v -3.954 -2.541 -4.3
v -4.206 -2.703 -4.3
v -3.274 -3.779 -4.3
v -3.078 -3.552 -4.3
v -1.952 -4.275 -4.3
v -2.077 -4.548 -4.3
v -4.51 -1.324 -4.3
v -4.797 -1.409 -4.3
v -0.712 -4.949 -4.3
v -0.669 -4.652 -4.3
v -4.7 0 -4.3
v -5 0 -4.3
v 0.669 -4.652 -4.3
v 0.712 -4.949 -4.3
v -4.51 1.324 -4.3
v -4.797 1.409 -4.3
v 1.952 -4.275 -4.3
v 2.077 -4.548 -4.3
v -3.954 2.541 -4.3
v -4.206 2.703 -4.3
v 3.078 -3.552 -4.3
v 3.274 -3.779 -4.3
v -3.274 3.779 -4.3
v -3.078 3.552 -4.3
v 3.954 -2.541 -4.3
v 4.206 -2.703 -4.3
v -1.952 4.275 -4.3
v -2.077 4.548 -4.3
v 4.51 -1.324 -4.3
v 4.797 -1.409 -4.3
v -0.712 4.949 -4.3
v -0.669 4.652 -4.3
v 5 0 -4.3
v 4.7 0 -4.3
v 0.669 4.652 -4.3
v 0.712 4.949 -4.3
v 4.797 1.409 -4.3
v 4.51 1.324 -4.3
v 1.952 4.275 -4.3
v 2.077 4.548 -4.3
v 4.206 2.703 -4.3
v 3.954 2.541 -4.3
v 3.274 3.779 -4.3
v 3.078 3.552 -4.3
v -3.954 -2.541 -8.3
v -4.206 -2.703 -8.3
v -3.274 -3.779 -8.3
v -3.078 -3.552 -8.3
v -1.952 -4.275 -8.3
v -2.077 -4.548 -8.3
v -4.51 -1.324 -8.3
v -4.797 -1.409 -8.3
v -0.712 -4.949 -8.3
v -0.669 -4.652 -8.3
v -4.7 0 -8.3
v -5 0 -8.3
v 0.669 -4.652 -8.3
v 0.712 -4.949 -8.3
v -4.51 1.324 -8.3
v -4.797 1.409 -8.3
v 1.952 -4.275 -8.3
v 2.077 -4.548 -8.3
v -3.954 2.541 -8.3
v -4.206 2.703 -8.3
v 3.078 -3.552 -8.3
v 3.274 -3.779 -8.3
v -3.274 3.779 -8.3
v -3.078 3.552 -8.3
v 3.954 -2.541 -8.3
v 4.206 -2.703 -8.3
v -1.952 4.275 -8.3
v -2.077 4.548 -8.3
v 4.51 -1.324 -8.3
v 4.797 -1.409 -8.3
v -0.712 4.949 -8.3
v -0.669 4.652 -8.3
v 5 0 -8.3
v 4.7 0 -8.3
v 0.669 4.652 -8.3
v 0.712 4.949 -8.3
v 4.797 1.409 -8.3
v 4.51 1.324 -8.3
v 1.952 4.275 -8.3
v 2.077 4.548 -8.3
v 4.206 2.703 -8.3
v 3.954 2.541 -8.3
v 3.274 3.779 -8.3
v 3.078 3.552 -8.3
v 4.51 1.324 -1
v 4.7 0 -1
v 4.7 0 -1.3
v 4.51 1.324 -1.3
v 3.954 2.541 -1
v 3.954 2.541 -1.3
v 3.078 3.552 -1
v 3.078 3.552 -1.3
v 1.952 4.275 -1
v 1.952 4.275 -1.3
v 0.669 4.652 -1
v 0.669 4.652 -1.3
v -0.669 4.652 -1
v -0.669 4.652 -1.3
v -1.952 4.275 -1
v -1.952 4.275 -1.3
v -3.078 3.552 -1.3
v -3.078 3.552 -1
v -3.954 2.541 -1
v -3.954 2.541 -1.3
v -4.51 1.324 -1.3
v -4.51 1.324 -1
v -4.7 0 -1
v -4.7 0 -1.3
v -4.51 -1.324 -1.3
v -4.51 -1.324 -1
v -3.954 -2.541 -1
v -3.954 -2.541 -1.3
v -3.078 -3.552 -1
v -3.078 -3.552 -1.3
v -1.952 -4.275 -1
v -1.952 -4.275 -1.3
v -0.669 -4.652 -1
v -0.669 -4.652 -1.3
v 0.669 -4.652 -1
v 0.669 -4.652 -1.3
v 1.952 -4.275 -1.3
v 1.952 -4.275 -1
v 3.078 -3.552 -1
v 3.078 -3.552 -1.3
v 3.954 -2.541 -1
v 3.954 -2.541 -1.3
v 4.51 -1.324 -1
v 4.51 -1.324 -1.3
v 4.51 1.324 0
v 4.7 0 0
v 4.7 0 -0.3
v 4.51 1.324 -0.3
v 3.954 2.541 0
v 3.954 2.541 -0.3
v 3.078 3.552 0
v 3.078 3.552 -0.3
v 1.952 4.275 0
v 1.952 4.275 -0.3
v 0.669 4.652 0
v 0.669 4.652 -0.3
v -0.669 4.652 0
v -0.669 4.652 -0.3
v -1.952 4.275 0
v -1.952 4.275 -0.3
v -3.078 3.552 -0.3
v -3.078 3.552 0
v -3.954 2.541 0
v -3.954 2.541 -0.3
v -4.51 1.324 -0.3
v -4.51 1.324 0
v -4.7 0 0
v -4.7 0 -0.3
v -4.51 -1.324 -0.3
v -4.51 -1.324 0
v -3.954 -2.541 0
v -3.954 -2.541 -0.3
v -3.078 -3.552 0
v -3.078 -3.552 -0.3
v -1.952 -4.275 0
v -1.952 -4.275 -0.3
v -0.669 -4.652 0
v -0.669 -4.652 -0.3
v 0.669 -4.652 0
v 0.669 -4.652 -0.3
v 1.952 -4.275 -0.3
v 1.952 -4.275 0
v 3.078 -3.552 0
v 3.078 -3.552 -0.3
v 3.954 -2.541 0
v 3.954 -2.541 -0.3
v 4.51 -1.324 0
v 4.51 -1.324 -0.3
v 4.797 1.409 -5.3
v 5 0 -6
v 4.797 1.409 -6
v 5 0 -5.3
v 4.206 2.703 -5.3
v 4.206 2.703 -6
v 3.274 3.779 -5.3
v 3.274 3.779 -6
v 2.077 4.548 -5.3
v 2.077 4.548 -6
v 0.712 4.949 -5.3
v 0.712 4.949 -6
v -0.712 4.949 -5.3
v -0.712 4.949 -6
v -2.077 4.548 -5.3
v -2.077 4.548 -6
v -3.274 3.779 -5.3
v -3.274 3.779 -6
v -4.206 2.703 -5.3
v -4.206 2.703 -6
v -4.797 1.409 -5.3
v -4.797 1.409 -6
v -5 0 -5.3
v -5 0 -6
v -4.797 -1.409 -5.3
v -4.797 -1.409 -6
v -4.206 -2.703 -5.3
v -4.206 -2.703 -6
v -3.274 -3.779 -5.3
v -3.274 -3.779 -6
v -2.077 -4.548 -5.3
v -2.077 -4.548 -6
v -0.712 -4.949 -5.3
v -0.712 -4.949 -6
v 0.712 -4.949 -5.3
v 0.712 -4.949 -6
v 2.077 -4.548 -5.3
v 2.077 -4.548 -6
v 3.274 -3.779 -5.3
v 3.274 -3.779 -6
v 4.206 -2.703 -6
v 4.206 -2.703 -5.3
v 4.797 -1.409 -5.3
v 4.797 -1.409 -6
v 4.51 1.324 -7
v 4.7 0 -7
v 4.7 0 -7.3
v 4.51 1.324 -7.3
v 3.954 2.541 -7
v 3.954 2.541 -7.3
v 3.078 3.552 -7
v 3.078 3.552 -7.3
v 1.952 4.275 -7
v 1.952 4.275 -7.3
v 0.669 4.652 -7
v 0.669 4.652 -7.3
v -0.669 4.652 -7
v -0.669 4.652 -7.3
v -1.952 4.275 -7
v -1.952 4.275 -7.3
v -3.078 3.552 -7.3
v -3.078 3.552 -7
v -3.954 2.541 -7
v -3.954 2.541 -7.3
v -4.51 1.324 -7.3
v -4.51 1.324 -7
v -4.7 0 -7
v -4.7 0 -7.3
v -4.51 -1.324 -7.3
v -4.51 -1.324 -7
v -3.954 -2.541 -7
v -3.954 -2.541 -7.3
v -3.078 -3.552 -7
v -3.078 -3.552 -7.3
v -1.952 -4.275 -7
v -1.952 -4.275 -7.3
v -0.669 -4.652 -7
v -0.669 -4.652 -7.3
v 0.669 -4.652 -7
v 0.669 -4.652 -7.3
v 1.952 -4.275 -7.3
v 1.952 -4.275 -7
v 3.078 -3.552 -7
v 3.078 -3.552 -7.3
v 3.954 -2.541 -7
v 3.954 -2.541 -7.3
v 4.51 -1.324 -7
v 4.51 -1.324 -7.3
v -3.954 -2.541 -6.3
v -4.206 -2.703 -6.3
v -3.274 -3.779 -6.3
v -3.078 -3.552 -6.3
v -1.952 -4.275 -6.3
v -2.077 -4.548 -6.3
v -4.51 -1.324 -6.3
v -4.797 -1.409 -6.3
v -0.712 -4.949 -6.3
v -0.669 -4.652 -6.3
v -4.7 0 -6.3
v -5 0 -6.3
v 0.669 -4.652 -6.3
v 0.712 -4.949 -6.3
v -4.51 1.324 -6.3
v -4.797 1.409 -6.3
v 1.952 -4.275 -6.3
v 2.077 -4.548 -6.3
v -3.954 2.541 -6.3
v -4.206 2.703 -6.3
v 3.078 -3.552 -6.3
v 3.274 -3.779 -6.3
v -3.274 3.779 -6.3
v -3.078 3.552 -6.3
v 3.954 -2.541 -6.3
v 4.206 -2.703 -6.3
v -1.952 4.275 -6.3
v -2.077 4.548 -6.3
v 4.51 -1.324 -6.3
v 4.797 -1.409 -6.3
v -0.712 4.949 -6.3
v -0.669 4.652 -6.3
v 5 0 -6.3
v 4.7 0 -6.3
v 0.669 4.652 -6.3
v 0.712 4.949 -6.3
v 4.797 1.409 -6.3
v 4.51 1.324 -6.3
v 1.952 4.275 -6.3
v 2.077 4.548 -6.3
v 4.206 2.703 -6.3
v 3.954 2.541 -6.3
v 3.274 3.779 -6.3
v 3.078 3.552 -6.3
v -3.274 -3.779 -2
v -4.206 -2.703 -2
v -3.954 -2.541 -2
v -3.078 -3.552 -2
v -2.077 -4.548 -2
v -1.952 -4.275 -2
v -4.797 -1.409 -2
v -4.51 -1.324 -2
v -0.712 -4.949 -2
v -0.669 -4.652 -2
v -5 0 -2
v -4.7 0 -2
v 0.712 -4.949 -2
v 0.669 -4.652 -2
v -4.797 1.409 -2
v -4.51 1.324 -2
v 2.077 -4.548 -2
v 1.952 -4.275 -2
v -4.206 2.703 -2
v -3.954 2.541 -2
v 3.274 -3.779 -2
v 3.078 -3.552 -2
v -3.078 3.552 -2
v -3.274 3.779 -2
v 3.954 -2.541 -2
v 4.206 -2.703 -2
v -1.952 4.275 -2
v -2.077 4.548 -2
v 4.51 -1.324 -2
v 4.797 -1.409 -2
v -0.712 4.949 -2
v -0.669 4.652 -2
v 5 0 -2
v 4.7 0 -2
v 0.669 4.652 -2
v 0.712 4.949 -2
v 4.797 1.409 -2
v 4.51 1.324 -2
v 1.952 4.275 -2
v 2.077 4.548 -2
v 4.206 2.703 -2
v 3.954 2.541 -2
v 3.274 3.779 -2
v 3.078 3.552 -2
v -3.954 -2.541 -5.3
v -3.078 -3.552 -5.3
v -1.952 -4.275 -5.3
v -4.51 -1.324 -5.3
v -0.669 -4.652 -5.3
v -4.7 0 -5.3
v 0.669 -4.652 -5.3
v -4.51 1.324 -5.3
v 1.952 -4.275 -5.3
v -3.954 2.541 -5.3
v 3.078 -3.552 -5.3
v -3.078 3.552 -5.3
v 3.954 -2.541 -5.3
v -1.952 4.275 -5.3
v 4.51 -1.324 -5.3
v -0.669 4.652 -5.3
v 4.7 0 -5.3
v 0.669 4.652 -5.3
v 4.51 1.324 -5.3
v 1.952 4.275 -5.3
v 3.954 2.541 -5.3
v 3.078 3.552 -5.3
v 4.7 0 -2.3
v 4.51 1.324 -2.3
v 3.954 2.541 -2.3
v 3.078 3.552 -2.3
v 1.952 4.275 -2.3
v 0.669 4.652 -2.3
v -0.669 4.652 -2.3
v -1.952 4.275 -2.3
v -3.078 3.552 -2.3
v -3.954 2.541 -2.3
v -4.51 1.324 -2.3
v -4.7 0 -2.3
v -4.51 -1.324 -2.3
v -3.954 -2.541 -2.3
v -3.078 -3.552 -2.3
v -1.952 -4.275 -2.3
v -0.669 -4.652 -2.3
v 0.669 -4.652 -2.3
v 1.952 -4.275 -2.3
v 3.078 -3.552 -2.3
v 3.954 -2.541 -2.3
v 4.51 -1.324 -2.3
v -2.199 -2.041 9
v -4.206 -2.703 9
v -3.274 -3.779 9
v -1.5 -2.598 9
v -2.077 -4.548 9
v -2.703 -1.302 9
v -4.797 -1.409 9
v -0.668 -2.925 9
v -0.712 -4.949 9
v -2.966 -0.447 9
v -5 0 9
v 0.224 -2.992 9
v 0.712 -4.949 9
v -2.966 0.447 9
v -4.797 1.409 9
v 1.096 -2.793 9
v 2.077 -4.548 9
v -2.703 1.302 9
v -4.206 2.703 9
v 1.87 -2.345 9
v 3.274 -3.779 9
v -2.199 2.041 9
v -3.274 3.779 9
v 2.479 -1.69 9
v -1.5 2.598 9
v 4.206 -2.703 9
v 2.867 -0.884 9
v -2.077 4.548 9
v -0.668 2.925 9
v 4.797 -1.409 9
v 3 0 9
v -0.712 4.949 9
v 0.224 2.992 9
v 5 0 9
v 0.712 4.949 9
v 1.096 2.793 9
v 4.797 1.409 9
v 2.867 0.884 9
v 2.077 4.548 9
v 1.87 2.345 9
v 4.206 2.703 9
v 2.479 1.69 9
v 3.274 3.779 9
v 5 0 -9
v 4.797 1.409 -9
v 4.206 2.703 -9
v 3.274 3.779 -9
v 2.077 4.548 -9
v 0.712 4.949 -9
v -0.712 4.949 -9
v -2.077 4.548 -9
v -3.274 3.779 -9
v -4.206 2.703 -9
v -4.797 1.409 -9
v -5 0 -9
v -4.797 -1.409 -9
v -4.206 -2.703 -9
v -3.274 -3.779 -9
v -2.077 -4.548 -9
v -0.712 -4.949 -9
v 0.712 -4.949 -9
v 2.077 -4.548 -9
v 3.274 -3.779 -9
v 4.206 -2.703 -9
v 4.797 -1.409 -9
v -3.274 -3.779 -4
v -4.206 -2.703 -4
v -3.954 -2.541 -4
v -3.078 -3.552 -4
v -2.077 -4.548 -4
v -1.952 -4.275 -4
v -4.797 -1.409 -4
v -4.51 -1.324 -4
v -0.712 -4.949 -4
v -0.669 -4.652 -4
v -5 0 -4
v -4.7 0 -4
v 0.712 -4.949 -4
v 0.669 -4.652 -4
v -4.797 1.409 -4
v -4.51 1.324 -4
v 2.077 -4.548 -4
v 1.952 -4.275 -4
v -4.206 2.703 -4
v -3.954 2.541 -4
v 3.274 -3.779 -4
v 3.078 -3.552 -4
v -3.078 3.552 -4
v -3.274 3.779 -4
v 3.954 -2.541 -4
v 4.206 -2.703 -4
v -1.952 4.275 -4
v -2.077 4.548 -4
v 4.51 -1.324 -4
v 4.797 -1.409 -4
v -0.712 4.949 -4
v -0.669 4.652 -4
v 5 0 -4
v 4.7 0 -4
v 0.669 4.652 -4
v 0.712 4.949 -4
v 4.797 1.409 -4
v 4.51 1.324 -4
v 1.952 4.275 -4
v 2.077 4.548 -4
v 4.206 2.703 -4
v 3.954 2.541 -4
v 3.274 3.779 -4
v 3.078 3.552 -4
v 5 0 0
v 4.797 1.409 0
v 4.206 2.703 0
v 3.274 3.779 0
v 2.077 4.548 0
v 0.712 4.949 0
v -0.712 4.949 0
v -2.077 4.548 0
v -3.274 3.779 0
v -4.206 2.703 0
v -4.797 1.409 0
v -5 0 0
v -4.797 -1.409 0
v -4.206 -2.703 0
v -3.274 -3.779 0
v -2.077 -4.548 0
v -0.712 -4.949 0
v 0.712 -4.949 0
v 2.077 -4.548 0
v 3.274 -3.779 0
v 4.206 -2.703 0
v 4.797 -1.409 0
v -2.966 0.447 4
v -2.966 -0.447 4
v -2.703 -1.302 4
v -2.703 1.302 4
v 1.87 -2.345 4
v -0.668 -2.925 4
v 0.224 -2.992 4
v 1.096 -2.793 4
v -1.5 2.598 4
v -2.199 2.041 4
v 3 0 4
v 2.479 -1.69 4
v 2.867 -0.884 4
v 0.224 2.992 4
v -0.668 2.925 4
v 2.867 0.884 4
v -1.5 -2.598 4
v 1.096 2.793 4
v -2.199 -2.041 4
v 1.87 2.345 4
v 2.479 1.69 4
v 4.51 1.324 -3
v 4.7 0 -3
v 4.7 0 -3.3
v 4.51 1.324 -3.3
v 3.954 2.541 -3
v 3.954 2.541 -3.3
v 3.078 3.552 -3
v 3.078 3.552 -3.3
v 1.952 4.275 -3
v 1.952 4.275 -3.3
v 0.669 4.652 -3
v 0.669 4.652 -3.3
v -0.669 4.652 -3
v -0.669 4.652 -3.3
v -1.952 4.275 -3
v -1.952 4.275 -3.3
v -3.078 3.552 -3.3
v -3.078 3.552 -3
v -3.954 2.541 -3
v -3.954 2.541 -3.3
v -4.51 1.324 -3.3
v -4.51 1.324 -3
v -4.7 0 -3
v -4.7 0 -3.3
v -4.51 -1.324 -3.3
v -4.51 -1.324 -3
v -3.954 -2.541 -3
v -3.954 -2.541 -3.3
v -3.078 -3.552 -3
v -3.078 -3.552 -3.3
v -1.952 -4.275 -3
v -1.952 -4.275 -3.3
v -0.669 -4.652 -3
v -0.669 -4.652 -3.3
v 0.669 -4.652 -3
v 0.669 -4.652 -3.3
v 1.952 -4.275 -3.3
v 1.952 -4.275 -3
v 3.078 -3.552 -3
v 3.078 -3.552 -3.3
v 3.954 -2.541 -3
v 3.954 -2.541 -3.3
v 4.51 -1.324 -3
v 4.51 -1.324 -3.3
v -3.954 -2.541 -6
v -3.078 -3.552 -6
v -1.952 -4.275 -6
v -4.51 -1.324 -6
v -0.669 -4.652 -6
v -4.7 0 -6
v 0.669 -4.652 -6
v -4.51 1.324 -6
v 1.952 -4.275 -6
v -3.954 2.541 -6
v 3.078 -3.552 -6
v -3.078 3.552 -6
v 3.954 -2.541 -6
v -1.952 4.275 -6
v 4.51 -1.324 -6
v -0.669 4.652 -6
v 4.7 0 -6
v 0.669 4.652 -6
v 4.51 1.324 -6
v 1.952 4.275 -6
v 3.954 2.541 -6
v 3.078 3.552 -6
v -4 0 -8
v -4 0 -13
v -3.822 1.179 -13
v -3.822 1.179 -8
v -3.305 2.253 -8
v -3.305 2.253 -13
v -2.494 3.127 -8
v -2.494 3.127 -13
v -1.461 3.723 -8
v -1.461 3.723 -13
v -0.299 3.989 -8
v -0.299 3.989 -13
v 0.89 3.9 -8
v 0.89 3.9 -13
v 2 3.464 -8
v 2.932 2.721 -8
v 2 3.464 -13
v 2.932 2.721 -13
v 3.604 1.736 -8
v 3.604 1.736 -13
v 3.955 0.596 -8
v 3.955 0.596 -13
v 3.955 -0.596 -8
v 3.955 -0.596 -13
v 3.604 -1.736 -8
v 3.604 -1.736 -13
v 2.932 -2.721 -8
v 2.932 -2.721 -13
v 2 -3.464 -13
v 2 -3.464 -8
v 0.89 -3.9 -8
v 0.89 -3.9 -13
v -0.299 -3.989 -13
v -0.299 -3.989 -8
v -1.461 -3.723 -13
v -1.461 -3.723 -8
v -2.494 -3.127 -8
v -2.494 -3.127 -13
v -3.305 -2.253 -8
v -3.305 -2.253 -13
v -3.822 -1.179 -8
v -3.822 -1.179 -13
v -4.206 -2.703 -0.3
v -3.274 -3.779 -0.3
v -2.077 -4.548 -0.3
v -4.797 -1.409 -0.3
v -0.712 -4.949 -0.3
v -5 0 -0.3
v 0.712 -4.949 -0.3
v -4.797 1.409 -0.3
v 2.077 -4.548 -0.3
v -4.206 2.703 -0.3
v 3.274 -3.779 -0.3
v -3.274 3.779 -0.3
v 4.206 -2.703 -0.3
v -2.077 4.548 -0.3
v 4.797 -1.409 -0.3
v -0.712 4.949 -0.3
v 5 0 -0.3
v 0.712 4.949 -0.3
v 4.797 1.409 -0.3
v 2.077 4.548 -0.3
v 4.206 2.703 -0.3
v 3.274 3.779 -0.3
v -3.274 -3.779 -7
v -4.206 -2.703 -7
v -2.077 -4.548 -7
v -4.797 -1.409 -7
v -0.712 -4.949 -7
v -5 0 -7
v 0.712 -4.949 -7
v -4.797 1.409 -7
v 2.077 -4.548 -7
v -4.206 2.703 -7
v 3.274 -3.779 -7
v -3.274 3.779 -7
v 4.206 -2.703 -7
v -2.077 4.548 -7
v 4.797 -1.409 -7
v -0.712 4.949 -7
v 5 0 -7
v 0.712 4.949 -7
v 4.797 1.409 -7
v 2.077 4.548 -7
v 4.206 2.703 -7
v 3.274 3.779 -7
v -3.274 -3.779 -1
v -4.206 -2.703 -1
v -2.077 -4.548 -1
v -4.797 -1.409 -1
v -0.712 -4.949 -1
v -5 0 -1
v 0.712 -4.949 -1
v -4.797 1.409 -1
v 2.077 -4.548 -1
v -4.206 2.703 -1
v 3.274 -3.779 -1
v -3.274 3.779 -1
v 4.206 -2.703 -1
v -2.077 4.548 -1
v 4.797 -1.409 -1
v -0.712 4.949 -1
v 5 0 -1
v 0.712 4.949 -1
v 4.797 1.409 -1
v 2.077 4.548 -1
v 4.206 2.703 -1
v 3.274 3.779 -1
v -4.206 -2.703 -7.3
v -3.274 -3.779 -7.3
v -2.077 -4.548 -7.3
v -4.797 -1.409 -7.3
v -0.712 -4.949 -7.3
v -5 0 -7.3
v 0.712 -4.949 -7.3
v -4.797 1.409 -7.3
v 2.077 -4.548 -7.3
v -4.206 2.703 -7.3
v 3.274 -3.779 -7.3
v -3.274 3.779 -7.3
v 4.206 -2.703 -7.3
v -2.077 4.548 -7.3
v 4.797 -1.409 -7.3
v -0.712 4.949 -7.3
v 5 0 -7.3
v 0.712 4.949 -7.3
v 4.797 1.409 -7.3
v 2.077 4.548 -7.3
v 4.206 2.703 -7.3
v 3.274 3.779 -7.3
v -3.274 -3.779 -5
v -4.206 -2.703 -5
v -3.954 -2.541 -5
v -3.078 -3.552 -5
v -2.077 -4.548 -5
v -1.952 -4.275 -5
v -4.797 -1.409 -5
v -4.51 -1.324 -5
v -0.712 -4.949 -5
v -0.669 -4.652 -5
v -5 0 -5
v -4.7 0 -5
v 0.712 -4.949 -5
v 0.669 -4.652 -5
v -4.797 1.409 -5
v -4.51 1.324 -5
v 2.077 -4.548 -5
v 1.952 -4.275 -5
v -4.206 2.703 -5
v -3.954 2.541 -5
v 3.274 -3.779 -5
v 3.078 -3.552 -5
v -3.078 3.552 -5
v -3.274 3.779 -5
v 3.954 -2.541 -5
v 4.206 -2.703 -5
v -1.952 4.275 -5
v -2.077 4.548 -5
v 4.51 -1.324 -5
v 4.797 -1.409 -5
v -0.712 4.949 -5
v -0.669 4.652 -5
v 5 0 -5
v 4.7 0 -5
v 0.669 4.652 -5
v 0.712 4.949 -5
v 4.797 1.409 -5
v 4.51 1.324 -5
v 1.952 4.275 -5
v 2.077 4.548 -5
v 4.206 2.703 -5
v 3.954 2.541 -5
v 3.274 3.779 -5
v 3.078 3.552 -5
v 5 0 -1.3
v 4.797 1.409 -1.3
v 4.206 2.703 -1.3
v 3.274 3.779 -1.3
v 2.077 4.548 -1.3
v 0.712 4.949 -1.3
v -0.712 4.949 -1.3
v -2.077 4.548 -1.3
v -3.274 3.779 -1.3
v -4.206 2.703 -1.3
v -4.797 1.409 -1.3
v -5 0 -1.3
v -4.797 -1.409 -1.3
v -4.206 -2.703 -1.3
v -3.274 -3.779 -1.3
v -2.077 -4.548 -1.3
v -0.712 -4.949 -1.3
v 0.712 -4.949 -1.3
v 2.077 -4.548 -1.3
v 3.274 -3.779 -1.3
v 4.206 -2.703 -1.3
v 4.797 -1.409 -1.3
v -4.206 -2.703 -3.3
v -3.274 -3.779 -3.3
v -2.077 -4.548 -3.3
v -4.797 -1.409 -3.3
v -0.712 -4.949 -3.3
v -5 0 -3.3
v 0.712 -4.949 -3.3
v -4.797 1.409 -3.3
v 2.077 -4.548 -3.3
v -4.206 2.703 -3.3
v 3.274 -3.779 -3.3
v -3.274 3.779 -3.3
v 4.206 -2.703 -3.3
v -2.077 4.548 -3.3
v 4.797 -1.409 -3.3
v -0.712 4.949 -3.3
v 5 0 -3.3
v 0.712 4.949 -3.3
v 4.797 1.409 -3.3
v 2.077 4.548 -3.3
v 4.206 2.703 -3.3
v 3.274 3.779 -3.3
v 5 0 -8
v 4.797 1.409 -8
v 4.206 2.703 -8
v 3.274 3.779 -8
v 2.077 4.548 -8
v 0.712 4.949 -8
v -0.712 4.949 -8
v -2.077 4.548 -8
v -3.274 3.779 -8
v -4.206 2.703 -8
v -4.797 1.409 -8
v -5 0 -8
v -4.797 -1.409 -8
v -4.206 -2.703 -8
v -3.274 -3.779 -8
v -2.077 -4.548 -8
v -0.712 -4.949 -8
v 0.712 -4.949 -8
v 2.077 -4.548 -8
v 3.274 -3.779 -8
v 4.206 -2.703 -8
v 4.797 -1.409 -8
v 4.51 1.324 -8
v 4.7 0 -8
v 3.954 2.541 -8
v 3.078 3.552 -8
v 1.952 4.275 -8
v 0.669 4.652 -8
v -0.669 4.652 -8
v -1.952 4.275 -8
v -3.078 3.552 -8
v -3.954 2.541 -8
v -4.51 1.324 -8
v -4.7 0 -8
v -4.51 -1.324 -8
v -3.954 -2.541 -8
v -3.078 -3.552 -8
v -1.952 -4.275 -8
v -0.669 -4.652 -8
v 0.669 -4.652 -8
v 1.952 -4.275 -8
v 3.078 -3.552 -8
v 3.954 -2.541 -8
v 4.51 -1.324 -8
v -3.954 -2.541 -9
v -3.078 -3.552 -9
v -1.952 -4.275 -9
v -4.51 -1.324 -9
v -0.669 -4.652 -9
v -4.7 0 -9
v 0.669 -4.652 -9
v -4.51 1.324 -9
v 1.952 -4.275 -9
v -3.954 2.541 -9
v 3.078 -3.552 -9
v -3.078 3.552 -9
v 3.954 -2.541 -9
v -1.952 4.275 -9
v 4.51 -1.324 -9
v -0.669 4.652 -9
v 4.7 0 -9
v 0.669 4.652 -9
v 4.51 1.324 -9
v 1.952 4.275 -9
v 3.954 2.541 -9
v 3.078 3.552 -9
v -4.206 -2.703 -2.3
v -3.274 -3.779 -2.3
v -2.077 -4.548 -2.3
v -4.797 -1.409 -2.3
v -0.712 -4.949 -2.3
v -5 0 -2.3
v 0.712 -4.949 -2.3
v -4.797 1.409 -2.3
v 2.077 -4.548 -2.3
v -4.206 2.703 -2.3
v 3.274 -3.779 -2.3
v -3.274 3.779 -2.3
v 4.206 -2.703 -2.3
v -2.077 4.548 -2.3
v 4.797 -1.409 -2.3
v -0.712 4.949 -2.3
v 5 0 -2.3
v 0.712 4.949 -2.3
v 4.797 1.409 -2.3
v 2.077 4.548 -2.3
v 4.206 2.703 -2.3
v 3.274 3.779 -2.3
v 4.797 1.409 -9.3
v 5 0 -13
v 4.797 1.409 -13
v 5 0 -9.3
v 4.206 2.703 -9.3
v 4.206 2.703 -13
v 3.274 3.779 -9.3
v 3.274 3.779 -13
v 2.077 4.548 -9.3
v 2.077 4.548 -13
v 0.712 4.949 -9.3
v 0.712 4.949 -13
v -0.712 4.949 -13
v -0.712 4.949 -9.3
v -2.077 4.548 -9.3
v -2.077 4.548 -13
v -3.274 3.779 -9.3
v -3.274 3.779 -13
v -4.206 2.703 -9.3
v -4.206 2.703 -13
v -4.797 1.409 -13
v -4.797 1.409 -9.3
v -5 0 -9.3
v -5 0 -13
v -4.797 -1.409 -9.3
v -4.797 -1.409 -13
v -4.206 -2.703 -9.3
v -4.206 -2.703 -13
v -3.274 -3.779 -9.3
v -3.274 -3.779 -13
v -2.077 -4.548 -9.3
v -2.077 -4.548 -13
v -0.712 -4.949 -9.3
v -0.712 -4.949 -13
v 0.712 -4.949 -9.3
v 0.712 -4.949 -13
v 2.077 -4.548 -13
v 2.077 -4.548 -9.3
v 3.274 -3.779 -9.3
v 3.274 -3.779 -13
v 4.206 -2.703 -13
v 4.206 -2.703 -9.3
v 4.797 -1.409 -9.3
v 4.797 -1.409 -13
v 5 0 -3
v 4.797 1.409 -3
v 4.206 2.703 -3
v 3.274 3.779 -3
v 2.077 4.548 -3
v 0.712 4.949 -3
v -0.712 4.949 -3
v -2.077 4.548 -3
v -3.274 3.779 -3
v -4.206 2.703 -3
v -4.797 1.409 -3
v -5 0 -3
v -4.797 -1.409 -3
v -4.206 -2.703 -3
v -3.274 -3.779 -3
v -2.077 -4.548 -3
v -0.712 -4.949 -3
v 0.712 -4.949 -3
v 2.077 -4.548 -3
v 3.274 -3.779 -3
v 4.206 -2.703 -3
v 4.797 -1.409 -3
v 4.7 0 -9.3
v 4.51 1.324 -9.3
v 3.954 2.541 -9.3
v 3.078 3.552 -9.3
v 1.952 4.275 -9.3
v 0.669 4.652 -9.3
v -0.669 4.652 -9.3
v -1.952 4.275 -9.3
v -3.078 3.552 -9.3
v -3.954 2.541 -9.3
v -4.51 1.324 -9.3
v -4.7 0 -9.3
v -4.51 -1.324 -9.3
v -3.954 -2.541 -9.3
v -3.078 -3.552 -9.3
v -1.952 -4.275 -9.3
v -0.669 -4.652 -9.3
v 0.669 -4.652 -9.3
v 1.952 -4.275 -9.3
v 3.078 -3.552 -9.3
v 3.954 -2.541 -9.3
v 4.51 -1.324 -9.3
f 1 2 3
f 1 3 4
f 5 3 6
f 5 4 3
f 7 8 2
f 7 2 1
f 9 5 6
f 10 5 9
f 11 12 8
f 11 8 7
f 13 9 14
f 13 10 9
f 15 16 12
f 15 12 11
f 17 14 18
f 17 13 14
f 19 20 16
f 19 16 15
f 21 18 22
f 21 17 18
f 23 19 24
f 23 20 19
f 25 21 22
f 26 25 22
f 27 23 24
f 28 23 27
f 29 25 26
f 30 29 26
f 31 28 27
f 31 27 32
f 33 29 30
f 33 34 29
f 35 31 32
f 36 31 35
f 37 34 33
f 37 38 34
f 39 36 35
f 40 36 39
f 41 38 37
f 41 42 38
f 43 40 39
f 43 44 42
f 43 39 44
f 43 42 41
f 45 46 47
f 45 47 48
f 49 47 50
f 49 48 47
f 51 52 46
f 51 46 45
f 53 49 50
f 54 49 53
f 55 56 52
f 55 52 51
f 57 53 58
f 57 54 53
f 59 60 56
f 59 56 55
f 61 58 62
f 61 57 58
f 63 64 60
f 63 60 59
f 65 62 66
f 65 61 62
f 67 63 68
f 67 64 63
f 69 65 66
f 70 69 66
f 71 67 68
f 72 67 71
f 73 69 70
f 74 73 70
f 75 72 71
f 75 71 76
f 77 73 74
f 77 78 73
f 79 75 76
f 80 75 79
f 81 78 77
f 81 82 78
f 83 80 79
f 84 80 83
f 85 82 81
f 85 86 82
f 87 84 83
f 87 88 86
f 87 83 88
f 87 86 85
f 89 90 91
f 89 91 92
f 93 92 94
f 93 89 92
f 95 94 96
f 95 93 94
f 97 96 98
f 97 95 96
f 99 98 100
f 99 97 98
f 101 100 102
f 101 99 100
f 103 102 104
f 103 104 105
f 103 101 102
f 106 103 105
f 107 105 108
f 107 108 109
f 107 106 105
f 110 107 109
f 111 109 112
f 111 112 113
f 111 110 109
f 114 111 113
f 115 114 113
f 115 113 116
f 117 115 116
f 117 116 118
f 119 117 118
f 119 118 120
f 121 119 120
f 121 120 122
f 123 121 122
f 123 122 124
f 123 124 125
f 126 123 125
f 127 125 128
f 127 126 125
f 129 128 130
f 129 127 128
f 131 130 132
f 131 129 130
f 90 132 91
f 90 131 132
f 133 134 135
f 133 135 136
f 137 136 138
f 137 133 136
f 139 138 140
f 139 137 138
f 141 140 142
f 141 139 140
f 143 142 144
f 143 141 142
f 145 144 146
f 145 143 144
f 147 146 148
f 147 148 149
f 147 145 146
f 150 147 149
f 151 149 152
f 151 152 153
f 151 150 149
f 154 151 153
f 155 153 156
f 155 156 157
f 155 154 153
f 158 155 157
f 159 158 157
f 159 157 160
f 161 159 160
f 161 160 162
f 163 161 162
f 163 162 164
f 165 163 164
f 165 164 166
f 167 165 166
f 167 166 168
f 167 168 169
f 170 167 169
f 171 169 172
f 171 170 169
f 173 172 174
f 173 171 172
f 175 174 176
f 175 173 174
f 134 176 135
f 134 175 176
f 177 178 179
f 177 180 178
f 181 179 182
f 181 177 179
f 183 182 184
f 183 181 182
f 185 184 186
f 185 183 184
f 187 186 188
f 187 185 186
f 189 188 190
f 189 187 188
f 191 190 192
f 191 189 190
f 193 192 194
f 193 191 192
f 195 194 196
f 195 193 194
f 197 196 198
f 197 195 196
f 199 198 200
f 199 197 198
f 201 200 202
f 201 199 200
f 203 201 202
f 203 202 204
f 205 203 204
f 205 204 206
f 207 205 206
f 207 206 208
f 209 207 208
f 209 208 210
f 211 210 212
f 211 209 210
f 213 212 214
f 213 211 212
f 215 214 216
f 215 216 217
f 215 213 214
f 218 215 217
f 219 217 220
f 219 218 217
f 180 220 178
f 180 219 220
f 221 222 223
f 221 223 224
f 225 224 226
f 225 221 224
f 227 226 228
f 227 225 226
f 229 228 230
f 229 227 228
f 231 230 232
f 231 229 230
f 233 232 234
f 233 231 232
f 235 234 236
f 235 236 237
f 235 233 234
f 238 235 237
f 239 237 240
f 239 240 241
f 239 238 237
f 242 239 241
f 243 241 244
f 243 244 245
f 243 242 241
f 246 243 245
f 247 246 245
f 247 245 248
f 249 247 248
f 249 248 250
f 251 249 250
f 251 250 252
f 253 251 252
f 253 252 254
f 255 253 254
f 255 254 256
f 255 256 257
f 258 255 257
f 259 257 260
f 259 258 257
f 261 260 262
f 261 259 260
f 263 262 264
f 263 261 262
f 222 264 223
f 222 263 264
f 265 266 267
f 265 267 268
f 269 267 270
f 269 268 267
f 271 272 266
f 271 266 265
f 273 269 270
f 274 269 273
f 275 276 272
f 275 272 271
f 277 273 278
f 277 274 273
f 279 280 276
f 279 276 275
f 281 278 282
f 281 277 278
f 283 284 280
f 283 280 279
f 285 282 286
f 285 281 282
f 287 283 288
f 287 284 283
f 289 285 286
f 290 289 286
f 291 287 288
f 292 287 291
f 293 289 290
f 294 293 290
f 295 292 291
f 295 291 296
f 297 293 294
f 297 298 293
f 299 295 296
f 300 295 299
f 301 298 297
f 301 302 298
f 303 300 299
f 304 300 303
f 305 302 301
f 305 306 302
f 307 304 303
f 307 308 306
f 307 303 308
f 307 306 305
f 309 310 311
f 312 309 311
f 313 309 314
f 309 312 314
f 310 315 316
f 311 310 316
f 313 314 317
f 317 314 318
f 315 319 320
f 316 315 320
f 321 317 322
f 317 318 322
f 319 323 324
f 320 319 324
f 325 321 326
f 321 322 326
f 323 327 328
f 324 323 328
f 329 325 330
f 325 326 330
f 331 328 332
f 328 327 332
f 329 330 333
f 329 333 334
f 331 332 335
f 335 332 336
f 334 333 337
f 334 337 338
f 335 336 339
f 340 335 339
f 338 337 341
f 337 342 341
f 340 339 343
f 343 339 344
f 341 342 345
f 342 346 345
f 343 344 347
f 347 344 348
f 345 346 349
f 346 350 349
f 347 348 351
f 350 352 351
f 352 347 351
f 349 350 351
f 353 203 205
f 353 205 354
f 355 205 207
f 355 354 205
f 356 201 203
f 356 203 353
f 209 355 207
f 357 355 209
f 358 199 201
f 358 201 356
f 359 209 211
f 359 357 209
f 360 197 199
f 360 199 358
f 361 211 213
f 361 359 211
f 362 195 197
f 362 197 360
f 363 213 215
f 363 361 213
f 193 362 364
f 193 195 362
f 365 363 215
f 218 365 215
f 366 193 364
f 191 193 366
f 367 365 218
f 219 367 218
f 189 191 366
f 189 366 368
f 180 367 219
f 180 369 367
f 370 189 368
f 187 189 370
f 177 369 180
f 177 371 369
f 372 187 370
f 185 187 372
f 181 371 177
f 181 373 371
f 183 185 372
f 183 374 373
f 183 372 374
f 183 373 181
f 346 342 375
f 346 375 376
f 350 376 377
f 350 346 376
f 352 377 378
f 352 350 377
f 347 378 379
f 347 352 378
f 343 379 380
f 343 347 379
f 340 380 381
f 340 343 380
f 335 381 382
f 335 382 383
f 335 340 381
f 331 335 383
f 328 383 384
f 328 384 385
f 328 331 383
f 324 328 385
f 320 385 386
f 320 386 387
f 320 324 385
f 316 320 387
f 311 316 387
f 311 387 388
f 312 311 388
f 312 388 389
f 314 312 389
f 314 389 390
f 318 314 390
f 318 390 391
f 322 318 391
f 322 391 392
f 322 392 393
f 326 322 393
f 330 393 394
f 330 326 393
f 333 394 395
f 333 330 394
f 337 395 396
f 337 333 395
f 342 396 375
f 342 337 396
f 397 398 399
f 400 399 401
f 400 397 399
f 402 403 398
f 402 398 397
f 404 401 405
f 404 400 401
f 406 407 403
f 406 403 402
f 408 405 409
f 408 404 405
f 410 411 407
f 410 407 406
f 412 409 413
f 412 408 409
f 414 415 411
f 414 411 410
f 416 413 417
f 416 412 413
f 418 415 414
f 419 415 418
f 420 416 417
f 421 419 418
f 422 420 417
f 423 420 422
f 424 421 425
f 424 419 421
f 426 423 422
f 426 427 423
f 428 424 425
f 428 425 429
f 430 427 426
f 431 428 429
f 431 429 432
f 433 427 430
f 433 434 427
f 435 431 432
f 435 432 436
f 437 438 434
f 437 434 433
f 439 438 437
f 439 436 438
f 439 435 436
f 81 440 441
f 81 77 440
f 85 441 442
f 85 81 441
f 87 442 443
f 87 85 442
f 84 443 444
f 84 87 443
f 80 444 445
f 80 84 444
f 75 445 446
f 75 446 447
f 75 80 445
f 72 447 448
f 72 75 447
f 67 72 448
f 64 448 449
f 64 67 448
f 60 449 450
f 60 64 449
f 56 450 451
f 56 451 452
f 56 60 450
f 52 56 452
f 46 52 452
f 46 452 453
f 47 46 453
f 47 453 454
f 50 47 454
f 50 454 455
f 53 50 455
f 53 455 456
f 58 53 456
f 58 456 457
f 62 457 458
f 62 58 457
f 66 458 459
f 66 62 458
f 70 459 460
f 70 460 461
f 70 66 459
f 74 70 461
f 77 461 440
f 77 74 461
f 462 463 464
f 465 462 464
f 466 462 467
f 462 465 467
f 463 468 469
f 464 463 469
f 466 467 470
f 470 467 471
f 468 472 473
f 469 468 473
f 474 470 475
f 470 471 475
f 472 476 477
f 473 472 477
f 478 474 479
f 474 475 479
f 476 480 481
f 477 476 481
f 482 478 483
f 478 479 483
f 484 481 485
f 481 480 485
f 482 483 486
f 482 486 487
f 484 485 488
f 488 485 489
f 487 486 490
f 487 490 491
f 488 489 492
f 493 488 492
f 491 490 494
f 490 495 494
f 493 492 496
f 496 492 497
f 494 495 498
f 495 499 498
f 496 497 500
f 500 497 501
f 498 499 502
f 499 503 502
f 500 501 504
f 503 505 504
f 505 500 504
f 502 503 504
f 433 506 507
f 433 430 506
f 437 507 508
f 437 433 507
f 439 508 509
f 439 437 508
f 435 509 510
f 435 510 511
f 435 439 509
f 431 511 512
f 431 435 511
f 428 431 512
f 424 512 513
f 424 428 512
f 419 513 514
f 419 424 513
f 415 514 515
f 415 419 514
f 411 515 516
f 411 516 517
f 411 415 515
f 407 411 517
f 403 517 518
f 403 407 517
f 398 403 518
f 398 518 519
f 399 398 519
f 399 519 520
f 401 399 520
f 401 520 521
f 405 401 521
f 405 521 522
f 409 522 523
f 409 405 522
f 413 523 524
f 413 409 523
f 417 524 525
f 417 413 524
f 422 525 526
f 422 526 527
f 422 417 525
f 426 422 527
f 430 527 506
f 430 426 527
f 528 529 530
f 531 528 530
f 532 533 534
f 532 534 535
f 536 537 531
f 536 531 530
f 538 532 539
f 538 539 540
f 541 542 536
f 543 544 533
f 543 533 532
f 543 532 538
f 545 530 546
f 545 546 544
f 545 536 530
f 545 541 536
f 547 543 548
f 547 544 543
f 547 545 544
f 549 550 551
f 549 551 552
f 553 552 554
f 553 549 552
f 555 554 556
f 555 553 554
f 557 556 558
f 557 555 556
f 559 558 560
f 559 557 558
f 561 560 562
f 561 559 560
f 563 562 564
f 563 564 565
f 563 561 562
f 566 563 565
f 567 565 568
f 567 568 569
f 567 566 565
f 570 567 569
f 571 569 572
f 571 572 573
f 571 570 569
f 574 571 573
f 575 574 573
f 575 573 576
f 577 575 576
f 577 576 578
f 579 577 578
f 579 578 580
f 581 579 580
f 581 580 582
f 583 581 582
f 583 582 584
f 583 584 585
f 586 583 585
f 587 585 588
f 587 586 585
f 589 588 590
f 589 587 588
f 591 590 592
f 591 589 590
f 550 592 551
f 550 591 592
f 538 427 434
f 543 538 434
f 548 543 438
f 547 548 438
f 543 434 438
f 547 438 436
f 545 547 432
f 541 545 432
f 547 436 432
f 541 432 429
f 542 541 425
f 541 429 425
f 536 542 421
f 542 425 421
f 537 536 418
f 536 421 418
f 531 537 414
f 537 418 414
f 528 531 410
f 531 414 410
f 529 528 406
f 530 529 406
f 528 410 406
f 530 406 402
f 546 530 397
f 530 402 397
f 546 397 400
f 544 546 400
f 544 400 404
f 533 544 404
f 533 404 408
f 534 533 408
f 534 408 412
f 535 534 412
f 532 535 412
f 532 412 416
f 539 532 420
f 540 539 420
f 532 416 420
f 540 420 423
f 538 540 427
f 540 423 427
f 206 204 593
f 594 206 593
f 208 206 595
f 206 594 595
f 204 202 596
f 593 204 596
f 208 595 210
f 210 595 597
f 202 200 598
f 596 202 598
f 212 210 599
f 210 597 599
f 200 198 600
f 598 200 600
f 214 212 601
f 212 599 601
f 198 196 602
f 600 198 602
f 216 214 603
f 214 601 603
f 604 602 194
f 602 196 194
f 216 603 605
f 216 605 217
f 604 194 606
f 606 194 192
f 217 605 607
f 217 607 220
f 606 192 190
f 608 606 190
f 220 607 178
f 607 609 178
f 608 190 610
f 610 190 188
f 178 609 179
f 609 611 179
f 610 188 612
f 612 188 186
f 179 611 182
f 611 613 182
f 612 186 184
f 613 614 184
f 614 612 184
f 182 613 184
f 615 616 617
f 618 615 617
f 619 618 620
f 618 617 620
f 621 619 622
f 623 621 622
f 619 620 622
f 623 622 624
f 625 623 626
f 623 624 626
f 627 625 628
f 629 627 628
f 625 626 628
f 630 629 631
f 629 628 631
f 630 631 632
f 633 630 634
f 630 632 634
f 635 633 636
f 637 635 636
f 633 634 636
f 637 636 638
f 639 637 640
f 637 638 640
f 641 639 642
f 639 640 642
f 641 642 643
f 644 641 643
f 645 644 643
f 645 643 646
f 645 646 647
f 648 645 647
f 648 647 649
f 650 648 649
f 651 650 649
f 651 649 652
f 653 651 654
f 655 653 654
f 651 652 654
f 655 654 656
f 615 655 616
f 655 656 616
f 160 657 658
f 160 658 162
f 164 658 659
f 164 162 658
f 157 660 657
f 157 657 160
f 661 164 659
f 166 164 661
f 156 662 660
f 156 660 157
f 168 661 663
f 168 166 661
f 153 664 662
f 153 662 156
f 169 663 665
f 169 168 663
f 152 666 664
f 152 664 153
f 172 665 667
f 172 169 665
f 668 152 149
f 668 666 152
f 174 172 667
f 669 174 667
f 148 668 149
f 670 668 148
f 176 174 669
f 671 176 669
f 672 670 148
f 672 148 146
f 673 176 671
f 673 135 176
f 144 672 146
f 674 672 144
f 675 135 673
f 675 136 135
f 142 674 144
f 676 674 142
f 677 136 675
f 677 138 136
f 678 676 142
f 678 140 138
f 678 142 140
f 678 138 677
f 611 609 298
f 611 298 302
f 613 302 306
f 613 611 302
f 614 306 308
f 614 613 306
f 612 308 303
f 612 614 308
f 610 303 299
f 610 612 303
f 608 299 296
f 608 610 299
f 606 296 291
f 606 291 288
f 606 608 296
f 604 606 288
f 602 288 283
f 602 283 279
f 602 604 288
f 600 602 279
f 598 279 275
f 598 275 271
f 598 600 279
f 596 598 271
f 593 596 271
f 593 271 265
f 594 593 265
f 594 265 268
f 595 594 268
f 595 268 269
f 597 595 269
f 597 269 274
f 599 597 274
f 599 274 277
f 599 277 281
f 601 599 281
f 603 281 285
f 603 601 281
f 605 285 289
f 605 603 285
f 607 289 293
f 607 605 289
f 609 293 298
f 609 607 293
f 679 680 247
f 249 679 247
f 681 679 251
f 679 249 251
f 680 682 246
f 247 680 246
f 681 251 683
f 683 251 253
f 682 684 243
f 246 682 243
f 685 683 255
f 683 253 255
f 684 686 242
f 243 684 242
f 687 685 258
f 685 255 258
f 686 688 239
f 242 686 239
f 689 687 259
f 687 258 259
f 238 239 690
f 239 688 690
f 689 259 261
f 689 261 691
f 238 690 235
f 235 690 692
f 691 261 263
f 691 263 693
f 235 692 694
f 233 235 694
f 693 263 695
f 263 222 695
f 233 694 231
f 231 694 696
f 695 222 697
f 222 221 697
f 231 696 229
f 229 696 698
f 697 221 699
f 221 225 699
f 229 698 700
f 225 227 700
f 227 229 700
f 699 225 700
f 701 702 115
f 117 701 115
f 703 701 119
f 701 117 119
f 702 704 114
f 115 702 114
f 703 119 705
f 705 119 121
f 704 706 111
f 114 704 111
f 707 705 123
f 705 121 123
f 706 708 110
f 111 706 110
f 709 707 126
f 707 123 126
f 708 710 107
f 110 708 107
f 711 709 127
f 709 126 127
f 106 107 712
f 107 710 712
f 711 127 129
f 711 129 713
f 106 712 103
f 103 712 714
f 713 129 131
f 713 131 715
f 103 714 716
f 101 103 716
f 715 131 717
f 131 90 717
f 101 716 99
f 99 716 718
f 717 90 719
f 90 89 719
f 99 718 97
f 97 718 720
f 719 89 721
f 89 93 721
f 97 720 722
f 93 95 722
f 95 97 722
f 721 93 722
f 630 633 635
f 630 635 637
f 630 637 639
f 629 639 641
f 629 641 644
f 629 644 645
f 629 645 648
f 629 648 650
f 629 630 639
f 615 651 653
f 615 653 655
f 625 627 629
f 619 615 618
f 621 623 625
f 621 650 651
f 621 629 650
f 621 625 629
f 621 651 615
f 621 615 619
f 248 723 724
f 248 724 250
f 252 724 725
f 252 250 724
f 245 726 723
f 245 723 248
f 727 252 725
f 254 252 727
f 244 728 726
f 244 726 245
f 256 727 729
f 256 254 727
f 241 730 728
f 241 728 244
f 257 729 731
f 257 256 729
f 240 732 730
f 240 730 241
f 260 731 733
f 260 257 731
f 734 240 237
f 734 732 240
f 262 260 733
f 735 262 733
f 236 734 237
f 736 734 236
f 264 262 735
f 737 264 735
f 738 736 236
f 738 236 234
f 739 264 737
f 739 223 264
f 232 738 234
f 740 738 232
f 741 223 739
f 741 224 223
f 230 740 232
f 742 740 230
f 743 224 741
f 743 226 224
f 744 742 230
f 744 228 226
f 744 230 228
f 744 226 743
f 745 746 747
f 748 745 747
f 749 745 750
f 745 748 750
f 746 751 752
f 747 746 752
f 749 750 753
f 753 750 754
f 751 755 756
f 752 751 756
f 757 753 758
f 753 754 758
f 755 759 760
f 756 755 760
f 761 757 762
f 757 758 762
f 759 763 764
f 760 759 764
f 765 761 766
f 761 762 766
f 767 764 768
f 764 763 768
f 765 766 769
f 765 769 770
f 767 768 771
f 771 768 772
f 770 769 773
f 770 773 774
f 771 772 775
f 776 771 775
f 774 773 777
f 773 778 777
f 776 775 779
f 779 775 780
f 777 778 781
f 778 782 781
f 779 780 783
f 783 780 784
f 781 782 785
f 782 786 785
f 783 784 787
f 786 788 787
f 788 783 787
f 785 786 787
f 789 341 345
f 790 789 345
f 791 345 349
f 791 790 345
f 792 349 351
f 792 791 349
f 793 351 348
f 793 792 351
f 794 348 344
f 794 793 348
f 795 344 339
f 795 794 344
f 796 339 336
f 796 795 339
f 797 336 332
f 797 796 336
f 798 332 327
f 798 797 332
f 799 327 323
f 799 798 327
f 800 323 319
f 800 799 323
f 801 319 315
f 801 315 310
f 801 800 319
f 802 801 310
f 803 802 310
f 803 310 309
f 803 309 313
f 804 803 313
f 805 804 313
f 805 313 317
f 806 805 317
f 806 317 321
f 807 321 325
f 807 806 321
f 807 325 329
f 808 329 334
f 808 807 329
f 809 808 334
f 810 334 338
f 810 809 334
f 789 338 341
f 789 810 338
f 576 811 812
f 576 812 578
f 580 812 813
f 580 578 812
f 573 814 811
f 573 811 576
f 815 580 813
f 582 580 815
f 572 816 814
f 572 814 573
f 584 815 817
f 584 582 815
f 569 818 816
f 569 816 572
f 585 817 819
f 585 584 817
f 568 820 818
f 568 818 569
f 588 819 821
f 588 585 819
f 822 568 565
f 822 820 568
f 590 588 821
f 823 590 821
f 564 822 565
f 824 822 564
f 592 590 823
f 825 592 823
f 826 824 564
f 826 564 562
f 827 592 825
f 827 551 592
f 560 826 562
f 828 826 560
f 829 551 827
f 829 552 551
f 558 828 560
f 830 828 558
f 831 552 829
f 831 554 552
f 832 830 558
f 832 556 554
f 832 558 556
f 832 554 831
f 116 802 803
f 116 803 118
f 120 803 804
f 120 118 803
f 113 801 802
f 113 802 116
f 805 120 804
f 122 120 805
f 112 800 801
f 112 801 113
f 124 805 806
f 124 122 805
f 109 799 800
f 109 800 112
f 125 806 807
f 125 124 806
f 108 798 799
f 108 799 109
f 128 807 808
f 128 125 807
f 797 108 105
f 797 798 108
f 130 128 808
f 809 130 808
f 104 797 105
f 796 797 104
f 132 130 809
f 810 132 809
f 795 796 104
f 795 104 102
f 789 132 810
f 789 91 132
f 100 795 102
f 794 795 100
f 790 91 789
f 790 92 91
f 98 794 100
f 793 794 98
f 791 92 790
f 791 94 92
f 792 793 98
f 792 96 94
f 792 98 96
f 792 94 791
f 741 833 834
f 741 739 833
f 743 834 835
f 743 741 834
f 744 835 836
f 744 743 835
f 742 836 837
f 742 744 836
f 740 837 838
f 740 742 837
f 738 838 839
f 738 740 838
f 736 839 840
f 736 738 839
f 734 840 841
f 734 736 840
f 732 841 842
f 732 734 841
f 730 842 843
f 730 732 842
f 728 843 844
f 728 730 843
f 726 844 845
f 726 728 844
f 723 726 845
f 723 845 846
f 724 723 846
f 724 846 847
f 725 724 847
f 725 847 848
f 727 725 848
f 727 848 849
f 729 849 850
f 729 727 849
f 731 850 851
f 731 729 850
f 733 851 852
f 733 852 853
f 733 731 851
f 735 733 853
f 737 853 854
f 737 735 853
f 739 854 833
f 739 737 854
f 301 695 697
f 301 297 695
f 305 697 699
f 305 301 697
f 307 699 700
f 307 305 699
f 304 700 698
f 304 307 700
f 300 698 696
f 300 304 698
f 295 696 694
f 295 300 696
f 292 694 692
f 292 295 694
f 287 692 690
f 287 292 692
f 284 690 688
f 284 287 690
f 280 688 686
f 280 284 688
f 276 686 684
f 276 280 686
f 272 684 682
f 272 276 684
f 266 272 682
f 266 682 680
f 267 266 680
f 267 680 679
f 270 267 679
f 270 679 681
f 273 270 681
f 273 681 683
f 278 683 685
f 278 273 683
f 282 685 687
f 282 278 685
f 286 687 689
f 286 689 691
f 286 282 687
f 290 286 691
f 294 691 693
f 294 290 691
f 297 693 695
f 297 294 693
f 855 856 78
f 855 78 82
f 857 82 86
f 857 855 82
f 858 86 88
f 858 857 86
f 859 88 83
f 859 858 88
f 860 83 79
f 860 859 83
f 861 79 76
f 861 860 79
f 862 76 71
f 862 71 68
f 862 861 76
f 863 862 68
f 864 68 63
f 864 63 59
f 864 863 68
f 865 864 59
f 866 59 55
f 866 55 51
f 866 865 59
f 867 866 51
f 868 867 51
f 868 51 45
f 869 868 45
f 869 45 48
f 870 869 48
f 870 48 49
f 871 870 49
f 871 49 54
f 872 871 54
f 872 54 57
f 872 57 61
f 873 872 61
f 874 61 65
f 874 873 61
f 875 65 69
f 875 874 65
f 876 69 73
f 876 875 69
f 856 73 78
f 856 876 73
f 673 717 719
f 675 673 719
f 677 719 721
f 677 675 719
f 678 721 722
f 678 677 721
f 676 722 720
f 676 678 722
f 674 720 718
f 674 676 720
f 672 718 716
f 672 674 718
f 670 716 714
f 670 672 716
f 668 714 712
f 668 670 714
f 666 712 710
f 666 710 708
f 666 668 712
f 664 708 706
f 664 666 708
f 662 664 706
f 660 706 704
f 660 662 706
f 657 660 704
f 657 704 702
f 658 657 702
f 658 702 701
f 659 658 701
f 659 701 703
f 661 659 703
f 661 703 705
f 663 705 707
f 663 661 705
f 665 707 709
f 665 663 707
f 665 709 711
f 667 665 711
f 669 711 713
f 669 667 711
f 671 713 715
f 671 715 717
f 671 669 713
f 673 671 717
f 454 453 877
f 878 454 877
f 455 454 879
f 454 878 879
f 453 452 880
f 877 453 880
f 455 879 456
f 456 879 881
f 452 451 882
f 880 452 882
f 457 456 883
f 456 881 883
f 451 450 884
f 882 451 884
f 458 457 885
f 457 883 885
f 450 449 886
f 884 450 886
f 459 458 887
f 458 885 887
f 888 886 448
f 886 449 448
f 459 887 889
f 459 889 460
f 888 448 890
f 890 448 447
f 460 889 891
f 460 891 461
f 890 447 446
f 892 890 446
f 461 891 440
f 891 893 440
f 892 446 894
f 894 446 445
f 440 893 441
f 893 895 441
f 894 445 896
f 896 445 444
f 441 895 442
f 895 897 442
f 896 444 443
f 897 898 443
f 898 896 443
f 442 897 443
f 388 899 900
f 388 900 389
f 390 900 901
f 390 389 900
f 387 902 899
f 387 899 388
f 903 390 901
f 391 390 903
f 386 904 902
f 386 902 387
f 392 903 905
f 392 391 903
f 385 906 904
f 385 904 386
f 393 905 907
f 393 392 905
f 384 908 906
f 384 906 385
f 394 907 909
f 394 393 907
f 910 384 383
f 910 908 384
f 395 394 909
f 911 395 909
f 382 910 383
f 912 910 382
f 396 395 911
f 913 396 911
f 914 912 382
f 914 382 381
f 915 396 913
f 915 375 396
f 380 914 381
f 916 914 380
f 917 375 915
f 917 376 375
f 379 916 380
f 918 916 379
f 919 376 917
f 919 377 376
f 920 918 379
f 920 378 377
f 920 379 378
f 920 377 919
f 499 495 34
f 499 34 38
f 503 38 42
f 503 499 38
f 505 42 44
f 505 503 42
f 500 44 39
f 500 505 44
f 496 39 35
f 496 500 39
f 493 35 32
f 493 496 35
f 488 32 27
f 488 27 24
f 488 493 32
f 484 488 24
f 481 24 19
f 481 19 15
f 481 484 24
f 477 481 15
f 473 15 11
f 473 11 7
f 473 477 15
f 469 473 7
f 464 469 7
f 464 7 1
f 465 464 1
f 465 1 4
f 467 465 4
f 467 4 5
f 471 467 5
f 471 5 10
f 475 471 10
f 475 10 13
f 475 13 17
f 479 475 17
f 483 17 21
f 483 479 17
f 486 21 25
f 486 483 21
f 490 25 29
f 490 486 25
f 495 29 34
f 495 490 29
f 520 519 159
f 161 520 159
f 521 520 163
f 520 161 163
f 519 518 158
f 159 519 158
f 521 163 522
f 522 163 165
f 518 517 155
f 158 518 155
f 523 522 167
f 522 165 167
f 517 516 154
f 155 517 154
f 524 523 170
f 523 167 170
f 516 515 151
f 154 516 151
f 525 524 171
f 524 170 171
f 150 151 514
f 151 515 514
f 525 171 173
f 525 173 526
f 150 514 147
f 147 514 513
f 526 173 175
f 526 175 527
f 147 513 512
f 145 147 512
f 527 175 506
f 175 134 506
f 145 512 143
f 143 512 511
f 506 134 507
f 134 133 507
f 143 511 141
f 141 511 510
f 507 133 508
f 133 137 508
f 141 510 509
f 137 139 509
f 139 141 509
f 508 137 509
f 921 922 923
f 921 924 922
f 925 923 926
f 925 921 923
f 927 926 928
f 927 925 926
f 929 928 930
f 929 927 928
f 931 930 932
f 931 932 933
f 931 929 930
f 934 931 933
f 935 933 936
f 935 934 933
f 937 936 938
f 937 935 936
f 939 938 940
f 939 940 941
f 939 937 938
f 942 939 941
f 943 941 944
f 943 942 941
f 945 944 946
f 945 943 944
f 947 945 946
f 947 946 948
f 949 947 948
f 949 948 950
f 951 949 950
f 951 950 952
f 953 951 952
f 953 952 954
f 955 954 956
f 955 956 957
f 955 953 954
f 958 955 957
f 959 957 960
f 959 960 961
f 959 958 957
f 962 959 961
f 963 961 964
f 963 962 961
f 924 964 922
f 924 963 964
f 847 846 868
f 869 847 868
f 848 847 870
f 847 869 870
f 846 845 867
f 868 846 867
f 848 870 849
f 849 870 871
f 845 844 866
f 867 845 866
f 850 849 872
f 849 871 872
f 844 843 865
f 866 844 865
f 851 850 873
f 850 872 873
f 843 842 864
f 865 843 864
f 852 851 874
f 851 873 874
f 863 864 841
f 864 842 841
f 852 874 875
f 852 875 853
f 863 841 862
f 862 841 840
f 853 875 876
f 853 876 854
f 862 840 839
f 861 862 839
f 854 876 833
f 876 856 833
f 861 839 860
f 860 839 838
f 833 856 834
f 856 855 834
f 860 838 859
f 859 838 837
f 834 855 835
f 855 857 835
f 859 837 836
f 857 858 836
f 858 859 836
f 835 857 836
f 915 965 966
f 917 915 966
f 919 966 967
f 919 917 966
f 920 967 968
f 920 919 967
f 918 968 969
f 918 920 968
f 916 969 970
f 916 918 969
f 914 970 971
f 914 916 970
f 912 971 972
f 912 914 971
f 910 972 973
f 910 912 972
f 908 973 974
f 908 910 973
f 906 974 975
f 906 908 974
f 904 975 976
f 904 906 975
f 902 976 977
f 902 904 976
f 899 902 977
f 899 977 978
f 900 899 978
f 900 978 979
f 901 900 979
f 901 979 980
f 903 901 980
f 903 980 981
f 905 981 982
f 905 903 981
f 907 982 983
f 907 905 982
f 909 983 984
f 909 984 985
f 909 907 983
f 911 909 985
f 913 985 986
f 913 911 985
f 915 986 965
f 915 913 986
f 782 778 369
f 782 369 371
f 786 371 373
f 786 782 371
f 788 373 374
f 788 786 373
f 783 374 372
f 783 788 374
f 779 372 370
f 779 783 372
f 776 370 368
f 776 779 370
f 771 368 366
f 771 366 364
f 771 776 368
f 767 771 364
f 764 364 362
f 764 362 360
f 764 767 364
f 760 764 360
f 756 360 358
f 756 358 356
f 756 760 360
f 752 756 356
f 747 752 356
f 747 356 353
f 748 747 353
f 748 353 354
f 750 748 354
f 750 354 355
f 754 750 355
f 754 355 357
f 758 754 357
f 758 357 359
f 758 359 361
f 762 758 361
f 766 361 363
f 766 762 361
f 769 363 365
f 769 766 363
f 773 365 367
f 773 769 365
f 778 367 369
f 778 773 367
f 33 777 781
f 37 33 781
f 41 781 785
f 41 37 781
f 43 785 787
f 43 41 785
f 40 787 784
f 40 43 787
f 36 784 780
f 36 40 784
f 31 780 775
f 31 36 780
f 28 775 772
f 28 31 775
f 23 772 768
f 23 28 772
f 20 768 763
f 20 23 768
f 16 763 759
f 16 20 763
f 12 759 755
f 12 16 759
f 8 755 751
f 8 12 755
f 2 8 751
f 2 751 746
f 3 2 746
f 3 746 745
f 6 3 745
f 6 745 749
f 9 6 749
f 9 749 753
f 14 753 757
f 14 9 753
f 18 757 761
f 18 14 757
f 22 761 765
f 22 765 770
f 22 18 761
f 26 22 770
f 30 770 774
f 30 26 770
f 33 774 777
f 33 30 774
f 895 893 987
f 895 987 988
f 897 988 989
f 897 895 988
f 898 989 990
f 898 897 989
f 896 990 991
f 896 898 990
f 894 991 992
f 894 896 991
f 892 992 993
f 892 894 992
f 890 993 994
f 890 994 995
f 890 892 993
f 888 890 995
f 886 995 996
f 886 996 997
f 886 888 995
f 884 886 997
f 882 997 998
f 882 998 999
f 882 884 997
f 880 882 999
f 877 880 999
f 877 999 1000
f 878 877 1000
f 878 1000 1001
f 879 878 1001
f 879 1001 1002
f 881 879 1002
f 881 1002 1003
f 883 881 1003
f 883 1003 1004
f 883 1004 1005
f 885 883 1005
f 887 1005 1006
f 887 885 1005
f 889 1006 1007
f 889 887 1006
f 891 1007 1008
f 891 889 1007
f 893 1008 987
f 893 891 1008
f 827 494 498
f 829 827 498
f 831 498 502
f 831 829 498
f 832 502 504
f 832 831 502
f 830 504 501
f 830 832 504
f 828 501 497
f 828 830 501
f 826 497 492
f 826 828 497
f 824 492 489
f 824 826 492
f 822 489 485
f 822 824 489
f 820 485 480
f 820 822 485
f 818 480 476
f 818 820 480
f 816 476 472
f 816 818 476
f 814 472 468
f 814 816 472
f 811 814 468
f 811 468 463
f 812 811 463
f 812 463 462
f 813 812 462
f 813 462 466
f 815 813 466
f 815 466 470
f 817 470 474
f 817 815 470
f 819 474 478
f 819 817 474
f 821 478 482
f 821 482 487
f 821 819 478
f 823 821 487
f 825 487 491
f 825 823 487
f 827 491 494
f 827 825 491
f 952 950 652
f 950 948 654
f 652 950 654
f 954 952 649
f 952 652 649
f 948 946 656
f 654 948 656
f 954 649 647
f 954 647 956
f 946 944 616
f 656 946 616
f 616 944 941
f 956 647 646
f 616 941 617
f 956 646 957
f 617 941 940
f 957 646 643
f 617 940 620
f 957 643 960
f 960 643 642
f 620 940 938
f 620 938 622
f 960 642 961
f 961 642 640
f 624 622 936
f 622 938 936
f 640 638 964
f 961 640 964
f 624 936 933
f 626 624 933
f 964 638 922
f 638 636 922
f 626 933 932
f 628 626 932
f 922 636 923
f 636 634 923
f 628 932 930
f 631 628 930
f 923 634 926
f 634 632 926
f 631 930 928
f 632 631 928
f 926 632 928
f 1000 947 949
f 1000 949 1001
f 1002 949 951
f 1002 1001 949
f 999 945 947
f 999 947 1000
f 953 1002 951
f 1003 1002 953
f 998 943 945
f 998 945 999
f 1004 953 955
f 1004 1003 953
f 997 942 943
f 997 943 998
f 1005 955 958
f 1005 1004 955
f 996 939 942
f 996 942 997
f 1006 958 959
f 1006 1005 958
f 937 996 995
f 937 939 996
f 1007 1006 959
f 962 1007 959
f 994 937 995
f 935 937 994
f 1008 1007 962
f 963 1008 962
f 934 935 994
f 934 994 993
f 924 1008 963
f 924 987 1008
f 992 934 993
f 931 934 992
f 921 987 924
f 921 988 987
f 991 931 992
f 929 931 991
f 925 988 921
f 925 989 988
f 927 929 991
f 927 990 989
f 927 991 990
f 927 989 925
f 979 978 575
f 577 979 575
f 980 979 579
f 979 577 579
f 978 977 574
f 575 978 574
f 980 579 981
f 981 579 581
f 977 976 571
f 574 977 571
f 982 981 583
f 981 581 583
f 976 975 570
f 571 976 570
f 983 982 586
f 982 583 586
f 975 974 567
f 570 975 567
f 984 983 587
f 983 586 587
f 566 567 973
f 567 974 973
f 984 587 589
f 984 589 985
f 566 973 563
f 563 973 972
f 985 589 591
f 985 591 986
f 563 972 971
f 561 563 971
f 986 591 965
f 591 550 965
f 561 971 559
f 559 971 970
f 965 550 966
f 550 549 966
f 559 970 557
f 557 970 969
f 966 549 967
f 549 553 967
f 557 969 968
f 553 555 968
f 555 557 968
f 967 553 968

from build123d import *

# Parameters (mm, degrees)
SKETCH1_R                = 5
BOSS_EXTRUDE1_DEPTH      = 9
BOSS_EXTRUDE1_DEPTH_BACK = 13
SKETCH2_R                = 3
CUT_EXTRUDE1_DEPTH       = 5
SKETCH3_R                = 4
CUT_EXTRUDE2_DEPTH       = 5
SKETCH5_R                = 5
SKETCH5_R_2              = 4.7
CUT_EXTRUDE3_DEPTH       = 0.3
LPATTERN1_COUNT          = 10
LPATTERN1_PITCH          = 1


with BuildPart() as part:
    # Sketch1 → Boss-Extrude1 (new body, two sides)
    with BuildSketch(Plane.XY) as boss_extrude1_sk:
        Circle(SKETCH1_R)
    extrude(amount=BOSS_EXTRUDE1_DEPTH)
    extrude(boss_extrude1_sk.sketch, amount=-BOSS_EXTRUDE1_DEPTH_BACK)

    # Sketch2 → Cut-Extrude1 (cut)
    with BuildSketch(Plane.XY.offset(9)):
        Circle(SKETCH2_R)
    extrude(amount=-CUT_EXTRUDE1_DEPTH, mode=Mode.SUBTRACT)

    # Sketch3 → Cut-Extrude2 (cut)
    with BuildSketch(Plane(origin=(0, 0, -13), x_dir=(-1, 0, 0), z_dir=(0, 0, -1))):
        Circle(SKETCH3_R)
    extrude(amount=-CUT_EXTRUDE2_DEPTH, mode=Mode.SUBTRACT)

    # Sketch5 → Cut-Extrude3 (cut)
    with BuildSketch(Plane.XY):
        Circle(SKETCH5_R)
        Circle(SKETCH5_R_2, mode=Mode.SUBTRACT)
    cut_extrude3 = extrude(amount=-CUT_EXTRUDE3_DEPTH, mode=Mode.SUBTRACT)

    # LPattern1: Cut-Extrude3 ×10
    with Locations(*[(0, 0, -i * LPATTERN1_PITCH) for i in range(1, LPATTERN1_COUNT)]):
        add(cut_extrude3, mode=Mode.SUBTRACT)


solid = part.part
